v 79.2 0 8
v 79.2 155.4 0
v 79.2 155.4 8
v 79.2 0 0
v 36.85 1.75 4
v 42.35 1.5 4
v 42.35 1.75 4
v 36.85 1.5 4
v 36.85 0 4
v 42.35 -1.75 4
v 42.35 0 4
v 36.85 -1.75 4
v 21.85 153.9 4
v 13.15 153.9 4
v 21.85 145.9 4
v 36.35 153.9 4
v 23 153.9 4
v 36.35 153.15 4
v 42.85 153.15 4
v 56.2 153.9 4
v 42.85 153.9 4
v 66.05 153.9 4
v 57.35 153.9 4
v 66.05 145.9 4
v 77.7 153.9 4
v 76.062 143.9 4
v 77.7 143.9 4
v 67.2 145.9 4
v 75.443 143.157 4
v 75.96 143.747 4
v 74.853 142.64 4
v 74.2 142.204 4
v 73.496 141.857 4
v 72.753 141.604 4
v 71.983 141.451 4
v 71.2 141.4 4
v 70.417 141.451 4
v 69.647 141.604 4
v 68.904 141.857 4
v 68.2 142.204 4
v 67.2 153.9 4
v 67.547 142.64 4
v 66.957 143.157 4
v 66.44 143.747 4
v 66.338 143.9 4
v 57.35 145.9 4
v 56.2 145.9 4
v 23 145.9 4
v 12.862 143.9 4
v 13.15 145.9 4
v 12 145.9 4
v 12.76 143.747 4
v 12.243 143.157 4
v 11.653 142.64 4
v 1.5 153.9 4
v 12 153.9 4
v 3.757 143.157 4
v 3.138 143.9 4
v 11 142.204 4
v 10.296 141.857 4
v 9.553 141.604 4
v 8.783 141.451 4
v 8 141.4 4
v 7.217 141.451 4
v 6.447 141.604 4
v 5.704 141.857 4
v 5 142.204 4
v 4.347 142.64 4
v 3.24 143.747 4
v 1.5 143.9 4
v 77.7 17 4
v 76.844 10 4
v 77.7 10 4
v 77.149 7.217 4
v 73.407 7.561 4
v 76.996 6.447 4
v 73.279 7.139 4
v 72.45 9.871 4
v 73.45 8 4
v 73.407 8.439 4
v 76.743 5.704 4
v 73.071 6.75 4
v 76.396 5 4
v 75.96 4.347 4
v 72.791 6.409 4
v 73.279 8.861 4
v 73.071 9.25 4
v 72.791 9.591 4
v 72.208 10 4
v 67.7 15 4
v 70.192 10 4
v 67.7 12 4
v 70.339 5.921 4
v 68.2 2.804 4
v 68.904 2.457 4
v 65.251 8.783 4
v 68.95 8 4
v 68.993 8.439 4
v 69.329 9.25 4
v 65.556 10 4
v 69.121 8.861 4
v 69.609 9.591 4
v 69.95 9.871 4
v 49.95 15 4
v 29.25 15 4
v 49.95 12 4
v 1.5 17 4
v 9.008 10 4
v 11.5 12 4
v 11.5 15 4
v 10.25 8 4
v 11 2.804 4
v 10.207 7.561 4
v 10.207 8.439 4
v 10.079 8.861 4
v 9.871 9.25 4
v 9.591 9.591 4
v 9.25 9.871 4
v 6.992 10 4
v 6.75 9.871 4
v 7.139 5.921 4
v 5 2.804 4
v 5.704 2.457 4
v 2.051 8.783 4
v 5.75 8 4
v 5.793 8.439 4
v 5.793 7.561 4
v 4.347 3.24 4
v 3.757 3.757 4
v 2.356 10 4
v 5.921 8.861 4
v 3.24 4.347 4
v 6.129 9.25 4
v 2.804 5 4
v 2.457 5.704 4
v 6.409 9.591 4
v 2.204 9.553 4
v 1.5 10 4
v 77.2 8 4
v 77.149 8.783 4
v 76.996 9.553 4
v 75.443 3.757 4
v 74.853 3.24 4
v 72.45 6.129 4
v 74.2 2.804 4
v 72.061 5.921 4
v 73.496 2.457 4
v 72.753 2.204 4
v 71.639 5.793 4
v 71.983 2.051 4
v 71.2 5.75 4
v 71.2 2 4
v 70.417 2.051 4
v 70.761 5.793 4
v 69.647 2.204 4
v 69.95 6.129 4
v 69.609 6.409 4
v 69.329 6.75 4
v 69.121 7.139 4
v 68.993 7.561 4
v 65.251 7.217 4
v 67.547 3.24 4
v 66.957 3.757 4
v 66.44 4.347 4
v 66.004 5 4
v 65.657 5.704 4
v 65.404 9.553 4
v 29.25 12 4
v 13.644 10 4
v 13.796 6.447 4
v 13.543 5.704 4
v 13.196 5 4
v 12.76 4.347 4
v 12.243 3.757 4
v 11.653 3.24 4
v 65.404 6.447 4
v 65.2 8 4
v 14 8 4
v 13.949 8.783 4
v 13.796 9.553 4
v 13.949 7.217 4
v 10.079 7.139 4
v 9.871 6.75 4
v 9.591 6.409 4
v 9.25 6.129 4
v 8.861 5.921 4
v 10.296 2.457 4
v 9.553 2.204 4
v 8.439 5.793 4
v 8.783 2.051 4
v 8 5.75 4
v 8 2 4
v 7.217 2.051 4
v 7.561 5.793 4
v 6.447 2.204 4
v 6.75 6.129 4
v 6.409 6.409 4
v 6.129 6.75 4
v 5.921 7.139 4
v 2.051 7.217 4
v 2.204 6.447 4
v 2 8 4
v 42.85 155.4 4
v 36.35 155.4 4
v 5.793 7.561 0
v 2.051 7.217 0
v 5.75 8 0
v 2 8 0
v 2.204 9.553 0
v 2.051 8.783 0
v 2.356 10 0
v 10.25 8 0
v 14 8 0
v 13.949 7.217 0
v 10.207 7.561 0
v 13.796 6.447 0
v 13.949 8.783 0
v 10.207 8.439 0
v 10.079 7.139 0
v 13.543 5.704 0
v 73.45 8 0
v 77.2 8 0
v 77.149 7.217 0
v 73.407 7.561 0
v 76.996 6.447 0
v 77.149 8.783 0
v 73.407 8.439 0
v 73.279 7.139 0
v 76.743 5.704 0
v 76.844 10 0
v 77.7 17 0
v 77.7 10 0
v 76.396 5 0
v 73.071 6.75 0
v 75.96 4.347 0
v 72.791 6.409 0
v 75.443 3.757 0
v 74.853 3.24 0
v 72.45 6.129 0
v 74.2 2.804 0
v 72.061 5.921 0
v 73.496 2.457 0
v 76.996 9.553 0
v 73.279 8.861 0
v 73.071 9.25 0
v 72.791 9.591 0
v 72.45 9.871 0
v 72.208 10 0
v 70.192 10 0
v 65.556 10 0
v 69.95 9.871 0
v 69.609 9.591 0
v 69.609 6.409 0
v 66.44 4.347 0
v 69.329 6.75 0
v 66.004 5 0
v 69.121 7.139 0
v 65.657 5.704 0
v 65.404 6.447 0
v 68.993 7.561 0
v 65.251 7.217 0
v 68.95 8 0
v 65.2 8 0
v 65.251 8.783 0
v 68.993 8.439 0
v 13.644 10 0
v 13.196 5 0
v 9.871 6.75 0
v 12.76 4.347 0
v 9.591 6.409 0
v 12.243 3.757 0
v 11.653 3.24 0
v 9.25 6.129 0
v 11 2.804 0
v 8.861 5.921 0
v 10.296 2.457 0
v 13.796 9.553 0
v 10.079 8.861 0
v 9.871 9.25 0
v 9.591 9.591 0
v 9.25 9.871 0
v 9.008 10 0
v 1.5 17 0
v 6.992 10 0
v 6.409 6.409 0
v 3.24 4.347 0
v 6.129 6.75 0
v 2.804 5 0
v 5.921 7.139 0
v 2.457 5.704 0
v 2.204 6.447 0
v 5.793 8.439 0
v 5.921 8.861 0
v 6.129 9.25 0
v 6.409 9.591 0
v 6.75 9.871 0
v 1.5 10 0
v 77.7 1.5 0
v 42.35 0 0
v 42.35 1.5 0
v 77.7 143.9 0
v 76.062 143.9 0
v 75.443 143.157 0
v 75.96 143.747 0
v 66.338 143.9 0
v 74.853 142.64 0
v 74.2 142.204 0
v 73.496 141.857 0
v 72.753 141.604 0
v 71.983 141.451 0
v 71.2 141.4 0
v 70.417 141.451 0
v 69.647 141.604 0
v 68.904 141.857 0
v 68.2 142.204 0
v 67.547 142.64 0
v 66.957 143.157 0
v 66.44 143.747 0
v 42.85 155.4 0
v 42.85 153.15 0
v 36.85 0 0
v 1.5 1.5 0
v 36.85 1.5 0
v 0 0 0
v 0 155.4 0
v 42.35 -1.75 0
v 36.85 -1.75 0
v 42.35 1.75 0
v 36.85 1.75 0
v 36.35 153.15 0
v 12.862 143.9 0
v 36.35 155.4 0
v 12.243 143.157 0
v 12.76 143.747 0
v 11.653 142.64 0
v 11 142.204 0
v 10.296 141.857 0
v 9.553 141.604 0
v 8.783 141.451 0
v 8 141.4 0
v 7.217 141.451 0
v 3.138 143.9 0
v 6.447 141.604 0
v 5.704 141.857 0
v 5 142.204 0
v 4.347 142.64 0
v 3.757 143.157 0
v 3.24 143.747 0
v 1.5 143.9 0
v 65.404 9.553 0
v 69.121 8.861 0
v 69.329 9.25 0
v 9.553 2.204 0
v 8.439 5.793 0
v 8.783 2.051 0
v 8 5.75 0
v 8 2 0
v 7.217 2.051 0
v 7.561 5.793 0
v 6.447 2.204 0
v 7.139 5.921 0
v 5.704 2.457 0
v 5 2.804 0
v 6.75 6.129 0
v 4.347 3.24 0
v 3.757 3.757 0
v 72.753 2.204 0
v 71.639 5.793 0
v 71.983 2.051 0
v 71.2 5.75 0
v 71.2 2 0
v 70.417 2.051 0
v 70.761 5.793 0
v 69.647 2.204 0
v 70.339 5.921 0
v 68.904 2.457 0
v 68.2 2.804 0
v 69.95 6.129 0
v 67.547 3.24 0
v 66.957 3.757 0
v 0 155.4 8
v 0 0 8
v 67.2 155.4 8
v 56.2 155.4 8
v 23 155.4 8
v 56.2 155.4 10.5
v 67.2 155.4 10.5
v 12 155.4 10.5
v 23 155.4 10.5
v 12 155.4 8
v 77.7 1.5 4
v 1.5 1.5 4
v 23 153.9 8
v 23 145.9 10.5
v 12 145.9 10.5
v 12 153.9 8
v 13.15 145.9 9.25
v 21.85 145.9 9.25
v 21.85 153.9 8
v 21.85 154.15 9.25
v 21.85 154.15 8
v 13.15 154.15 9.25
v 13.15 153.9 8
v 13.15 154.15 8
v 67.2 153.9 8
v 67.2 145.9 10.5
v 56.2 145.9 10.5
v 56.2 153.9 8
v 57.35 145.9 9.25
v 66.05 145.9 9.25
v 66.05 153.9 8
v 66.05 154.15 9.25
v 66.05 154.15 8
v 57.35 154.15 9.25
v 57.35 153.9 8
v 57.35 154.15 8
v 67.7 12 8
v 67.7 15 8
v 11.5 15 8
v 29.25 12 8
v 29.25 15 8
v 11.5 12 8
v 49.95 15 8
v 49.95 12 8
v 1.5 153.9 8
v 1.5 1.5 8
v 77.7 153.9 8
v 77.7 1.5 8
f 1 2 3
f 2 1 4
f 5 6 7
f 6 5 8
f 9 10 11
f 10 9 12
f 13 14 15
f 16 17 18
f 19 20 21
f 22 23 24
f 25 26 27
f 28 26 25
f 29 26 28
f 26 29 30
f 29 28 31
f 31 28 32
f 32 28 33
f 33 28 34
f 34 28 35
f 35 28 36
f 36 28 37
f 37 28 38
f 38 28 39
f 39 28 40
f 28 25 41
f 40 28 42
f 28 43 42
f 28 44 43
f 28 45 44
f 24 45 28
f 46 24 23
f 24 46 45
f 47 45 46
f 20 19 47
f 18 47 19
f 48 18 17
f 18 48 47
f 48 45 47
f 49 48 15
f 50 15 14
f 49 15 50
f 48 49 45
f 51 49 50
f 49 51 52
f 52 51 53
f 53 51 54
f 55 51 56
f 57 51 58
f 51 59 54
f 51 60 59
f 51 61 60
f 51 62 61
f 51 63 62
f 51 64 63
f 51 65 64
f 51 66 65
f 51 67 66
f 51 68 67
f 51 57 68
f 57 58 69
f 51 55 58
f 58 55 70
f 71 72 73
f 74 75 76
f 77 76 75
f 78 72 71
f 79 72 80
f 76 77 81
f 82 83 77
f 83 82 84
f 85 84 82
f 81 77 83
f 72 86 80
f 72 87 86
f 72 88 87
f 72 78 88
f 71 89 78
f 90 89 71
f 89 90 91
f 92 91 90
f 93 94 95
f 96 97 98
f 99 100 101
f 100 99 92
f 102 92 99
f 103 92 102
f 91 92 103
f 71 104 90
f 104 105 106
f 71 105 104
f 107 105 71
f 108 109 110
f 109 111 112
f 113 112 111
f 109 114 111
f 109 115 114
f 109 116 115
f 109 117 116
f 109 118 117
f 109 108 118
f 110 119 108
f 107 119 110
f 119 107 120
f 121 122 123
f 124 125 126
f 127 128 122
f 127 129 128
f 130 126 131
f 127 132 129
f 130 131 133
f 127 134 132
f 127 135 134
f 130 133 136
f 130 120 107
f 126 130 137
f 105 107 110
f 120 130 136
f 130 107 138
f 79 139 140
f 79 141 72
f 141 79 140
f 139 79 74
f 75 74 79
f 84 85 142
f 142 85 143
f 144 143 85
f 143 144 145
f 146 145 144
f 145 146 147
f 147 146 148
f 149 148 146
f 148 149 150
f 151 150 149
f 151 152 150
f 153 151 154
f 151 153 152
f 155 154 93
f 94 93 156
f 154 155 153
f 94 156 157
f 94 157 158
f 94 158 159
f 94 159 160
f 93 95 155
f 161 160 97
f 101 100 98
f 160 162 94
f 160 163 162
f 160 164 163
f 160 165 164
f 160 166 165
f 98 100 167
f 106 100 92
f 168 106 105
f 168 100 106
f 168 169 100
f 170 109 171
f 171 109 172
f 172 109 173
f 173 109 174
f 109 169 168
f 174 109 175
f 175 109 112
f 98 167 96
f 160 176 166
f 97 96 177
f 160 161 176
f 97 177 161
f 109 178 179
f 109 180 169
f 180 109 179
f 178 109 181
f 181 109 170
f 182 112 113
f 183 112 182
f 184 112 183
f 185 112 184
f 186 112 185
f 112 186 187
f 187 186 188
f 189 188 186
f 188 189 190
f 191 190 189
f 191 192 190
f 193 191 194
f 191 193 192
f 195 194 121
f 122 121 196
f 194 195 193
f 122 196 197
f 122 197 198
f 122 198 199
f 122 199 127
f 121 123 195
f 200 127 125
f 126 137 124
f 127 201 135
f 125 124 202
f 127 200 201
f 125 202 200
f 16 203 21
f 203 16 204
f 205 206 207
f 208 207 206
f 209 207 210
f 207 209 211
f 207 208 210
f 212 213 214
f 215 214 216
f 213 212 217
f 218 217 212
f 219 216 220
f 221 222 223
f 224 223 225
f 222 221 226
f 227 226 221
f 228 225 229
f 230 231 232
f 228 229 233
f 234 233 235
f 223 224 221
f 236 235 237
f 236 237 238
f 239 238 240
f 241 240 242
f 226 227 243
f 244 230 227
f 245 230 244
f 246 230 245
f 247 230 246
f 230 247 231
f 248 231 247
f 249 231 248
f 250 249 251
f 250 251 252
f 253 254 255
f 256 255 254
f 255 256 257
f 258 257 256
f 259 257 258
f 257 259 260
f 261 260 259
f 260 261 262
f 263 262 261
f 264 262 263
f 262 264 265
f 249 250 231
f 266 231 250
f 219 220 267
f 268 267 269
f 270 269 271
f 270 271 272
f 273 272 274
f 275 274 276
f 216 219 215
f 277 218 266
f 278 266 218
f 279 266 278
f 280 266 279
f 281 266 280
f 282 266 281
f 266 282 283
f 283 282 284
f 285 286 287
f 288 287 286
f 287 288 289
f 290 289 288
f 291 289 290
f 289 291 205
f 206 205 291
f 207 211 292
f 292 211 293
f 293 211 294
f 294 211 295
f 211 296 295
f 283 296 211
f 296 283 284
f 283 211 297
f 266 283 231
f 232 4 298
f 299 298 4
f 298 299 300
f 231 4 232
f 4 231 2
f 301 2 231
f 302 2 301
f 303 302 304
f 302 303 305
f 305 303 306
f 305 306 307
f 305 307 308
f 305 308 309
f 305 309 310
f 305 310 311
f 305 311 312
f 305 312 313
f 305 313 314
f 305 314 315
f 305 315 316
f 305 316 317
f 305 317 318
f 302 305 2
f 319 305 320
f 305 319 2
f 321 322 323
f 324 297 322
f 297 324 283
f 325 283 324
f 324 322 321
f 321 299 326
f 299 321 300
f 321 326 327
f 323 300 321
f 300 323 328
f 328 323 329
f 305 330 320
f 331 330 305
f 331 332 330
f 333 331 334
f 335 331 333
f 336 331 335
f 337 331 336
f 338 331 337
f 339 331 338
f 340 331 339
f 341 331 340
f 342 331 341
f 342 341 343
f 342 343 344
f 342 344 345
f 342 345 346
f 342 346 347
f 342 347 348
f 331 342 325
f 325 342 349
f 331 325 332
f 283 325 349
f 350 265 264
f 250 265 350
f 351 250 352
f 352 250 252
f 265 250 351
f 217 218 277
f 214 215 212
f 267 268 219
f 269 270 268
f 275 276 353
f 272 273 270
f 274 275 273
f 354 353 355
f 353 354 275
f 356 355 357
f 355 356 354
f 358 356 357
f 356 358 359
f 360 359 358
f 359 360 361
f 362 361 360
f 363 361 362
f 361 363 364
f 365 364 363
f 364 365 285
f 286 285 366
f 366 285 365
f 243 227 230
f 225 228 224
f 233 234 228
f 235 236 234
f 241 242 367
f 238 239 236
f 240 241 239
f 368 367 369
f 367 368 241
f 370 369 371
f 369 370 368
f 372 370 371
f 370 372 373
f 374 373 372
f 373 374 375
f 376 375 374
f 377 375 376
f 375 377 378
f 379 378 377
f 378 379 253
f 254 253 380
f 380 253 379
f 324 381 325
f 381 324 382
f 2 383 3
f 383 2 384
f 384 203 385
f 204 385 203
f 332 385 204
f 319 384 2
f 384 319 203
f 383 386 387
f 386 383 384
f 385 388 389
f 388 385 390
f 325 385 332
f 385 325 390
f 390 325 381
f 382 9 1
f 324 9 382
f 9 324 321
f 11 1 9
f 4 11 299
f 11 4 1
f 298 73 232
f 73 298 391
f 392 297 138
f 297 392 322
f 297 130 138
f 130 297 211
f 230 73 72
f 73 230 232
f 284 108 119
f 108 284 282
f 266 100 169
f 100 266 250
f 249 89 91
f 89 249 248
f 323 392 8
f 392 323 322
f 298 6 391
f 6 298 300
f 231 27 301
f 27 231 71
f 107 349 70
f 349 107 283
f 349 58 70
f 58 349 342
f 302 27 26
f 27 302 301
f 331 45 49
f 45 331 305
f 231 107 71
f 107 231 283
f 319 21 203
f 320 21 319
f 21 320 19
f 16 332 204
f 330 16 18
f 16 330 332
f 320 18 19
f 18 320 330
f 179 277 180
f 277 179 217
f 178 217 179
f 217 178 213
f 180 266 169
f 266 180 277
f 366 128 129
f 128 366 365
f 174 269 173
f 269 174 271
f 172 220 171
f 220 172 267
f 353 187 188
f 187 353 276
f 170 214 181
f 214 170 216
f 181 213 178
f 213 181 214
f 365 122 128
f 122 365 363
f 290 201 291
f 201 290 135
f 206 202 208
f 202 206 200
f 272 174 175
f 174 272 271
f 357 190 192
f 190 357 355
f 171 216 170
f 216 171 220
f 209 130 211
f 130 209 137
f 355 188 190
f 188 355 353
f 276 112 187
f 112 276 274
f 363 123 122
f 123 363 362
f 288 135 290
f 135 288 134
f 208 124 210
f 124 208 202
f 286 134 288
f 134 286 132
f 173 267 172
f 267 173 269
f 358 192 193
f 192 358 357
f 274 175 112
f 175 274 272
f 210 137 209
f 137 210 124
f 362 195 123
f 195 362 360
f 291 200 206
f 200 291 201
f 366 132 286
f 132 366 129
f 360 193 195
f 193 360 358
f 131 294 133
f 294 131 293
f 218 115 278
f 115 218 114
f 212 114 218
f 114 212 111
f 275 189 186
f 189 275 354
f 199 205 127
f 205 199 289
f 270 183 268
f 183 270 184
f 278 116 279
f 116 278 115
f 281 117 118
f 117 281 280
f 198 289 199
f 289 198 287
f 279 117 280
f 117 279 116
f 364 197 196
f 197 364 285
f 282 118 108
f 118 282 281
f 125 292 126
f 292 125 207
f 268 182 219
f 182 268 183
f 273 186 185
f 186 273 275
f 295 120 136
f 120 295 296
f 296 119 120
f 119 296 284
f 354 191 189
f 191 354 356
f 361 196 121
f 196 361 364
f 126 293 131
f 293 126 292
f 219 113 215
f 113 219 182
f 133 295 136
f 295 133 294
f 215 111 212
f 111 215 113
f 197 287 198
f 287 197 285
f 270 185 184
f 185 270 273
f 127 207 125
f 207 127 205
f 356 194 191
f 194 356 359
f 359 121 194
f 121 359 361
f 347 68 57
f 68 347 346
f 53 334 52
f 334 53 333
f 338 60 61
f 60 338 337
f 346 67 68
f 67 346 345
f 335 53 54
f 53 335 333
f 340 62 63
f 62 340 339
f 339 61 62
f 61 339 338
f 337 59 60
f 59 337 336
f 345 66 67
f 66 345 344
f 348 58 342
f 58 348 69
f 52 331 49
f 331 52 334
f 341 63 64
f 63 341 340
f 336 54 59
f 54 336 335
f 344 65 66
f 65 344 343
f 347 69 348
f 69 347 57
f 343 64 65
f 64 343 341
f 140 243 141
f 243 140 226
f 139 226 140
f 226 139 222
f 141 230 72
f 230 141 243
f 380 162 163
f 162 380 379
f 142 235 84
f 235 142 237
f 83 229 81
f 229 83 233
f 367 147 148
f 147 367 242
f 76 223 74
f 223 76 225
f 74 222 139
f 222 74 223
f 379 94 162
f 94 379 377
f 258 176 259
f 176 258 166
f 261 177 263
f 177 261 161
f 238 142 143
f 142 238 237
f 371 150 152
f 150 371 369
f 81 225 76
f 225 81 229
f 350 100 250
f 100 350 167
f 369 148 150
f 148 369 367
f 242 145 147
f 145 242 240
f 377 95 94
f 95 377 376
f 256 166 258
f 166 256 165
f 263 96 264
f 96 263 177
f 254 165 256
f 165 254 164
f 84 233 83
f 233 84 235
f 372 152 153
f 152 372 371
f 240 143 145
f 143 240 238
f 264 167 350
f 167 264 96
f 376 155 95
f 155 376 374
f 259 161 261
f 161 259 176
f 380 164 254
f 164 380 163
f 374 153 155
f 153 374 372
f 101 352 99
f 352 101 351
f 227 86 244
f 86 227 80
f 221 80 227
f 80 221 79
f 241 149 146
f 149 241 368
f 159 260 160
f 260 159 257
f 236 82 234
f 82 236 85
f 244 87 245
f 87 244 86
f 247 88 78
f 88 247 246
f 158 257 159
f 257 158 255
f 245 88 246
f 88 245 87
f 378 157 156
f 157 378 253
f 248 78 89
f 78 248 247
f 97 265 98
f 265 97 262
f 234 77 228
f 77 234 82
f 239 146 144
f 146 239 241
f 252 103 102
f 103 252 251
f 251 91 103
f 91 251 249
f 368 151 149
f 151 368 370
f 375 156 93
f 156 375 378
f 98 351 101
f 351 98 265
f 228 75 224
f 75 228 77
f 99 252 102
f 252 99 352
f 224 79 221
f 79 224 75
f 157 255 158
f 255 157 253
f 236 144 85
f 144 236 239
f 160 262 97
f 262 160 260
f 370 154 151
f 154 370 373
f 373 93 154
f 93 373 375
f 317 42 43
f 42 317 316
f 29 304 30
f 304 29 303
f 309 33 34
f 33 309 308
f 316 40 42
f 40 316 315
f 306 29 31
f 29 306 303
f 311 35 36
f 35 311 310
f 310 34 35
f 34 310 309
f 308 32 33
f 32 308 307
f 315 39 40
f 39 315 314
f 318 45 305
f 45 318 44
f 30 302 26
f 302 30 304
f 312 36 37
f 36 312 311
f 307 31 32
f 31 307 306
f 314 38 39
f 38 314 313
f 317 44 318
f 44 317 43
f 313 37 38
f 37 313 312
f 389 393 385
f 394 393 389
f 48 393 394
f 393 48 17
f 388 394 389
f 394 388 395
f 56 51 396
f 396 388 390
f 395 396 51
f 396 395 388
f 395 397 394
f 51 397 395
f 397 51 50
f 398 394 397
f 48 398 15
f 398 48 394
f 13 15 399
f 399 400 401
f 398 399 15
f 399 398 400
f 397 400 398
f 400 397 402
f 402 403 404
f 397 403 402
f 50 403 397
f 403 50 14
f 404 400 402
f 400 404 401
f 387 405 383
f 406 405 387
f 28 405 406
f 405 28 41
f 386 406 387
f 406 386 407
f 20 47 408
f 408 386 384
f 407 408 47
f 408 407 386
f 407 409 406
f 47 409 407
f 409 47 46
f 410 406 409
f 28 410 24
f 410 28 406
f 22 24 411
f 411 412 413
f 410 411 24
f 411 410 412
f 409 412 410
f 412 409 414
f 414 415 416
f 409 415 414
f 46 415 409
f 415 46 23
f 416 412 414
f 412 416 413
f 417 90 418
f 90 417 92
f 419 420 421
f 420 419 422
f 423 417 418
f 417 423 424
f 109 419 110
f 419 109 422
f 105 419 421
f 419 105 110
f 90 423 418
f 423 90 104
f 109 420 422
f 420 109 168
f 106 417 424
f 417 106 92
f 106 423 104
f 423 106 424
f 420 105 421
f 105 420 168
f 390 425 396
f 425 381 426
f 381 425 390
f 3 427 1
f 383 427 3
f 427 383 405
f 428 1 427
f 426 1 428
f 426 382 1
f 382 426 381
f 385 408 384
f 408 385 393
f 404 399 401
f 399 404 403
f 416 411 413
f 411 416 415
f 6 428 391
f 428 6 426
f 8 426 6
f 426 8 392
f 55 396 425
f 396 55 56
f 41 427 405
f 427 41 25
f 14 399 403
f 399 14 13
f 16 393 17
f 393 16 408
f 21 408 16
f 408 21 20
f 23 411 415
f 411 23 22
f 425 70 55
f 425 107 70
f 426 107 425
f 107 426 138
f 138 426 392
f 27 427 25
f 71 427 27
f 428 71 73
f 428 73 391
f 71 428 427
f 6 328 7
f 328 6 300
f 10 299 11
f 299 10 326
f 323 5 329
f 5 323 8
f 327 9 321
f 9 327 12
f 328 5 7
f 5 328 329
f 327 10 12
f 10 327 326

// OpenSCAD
// Interchangeable snap-tile backsplash MVP, grid-A1 / carrier-A1 / clip-A1.
// Units are millimetres. Export one part at a time with -D 'part="grid"' etc.

$fn = 48;

tile_w = 76.2;
tile_h = 152.4;
grout = 3.0;
pitch_w = tile_w + grout;
pitch_h = tile_h + grout;
wall = 4.0;
rib = 1.5;
hook_depth = 8.0;
hook_height = 4.0;
// Hook envelope height as printed: 1mm base offset + (hook_height - 1) body +
// 1mm lip rise = hook_height + 1. Receiver clearance must be sized to this full
// envelope, not just hook_height, or the lip collides with the roof.
hook_env_h = hook_height + 1.0;
clip_datum = 12.0;
release_depth = 10.0;
mount_z = wall;
registration_clearance = 0.25;
fastener_diameter = 4.5;
fastener_boss_radius = 6.0;
fastener_offset = 8.0;
clearance = 0.35;
interface_y = pitch_h - rib - hook_depth;
hook_local_y = interface_y - rib + clearance;
hook_local_x_left = 16 - hook_depth / 2 + clearance;
hook_local_x_right = tile_w - 12 - hook_depth + clearance;
latch_tab_w = 20;
latch_tab_x0 = pitch_w / 2 - latch_tab_w / 2;
latch_rail_x0 = rib + 10;
latch_rail_x1 = pitch_w - rib - 10;
latch_rail_y0 = clip_datum;
latch_rail_depth = 3;
// Position the finger beyond the rail end while the ridge overlaps it by
// 0.15 mm, providing the intended insertion interference and seated capture.
clip_mount_x0 = latch_tab_x0 - clearance - rib + 0.35;
clip_mount_y0 = latch_rail_y0 + clearance - rib;
// Latch geometry: the tab is a single rigid, full-height block bonded directly
// into the carrier floor (durable, load-carrying, replaceable per-tile part).
// Compliance and retention live in the separately replaceable spring_clip.
ridge_reach = 0.9;
ridge_z0 = 3.0;
ridge_h = 1.0;
// Ridge tip construction allowance: hull() needs each control primitive to
// have real (non-zero) extent, so the tip primitive below is built as a tiny
// cube instead of a mathematical point. That cube is centered on x =
// ridge_reach (translated back by half its own width) instead of starting
// at ridge_reach and extending outward, so it adds only half its width to
// the modeled max reach, not its full width. Its size is also cut 5x smaller
// than a typical previous choice (0.01 mm) specifically so that residual is
// sub-micron and can be safely folded into ridge_reach_eff below rather than
// silently inflating the physical geometry past the documented ridge_reach.
ridge_pt_eps = 0.002;
// Modeled maximum X reach of the ridge, including the construction
// allowance above (ridge_reach + half of ridge_pt_eps): this is the value
// that must drive the insertion/removal calculation below, not the nominal
// ridge_reach alone, so the strain calculation matches the rendered geometry.
// ridge_reach_eff = 0.9 + 0.002 / 2 = 0.901 mm.
ridge_reach_eff = ridge_reach + ridge_pt_eps / 2;
// Spring-finger geometry (service-clip side): the replaceable clip contains a
// cantilever fixed only at its base and free over its full height, thin in
// the X (lateral flex) direction. Its root uses a finite-radius shoulder
// feature and is wider than the uniform finger section; the resulting
// shoulder concentration is included in the estimate below.
//
// The ridge occupies z = ridge_z0 to ridge_z0 + ridge_h, and its maximum
// reach is used as the strain load point. The strain-governing cantilever
// length is therefore the distance from the fixed root (z = wall) to that
// point, eff_l = ridge_z0 + ridge_h / 2 = 3.0 + 0.5 = 3.5 mm -- not
// hook_height (4.0 mm) as an earlier revision assumed.
//
// Clearing the ridge on insertion needs a lateral displacement of
// delta_pass = ridge_reach_eff - 2 * clearance = 0.901 - 2 * 0.35 =
// 0.201 mm. For a cantilever of length eff_l = 3.5 mm and thickness
// finger_w = 0.8 mm (bending direction), the nominal (unconcentrated)
// worst-case insertion fiber strain is
// eps_insert_nom = 3 * finger_w * delta_pass / (2 * eff_l^2)
//                = 3 * 0.8 * 0.201 / (2 * 3.5^2) = 0.4824 / 24.5 = 0.01969,
// i.e. ~1.97%.
//
// That nominal strain is a beam-theory average and does not by itself
// capture the root's stress (and strain) concentration from the
// finger_w -> finger_w + root_fillet_r shoulder fillet at z = wall. Modeling
// that root as a stepped-flat-bar shoulder fillet in bending (Peterson /
// Pilkey polynomial fit) with D = finger_w + root_fillet_r = 1.2 mm,
// d = finger_w = 0.8 mm, r = root_fillet_r = 0.4 mm:
//   h = (D - d) / 2 = 0.2 mm, h / r = 0.5 (in the 0.1-2.0 fit range), so
//   C1 = 1.006 + 0.967 * sqrt(h/r) + 0.013 * (h/r)       = 1.696
//   C2 = -0.270 - 2.372 * sqrt(h/r) + 0.708 * (h/r)      = -1.594
//   C3 = 0.662 + 1.157 * sqrt(h/r) - 0.908 * (h/r)       = 1.026
//   C4 = -0.405 + 0.249 * sqrt(h/r) - 0.200 * (h/r)      = -0.329
//   x = 2h / D = 0.4 / 1.2 = 0.333
//   Kt = C1 + C2 * x + C3 * x^2 + C4 * x^3 = 1.267
// (Pilkey, "Peterson's Stress Concentration Factors", shoulder-fillet-in-
// bending chart; C1..C4 depend only on h/r, which is fixed at 0.5 here
// because D - d always equals root_fillet_r by construction, independent of
// finger_w.)
//
// Peak local (root) strain = Kt * nominal strain:
// eps_insert = Kt * eps_insert_nom = 1.267 * 0.01969 = 0.02495, i.e. ~2.49%,
// under the 3% allowable-strain target for printed PLA/PETG flexures.
// Removal is symmetric about the ridge's mid-height (same delta_pass, same
// eff_l), so eps_remove = eps_insert = ~2.49%.
//
// In the seated position the finger is unloaded after the ridge passes the
// rigid rail end; insertion and removal therefore govern the cycle estimate.
finger_w = 0.8;
// Root shoulder radius used by the clip geometry and concentration estimate.
root_fillet_r = 0.4;
// Bonding epsilon keeps the durable rail rooted in the grid floor rather than
// relying on a coincident face. OpenSCAD warns that exactly-touching unions can
// render non-manifold or as separate shells.
// bond_eps sets how far each feature is extended into its parent solid; it
// is well within finger_w (0.8 mm) and does not change any externally
// visible dimension (hook_height, ridge_reach, eff_l, etc.).
bond_eps = 0.6;
// Upper-receiver capturing geometry: a back wall and roof beyond the hook's
// nominal footprint so the installed lip is captured, not just clearance-fit.
receiver_back = 1.5;
receiver_roof = 1.5;

part = "grid"; // grid, carrier, carrier_assembly, flex_clip, flex_coupon, spring_clip, coupon, hook_coupon, latch_coupon, registration_coupon, panel

module rounded_box(size, radius = 1.5) {
    translate([radius, radius, radius]) {
        minkowski() {
            cube([size[0] - 2 * radius, size[1] - 2 * radius, size[2] - 2 * radius]);
            sphere(radius);
        }
    }
}

module grid_section() {
    // The inspection hole is cut in two bands, leaving solid
    // full-width bridges under the latch rail and each upper-receiver housing so
    // those features bond into the perimeter frame instead of floating over the
    // open center.
    band_bottom_y0 = latch_rail_y0 - 2;
    band_bottom_y1 = latch_rail_y0 + latch_rail_depth + 2;
    band_top_y0 = interface_y - 2;
    band_top_y1 = interface_y + hook_depth + receiver_back + 2;
    difference() {
        cube([pitch_w, pitch_h, wall]);
        // Keep the center open so the wall surface can be inspected and dried.
        translate([rib, rib, -0.1])
            cube([pitch_w - 2 * rib, band_bottom_y0 - rib, wall + 0.2]);
        translate([rib, band_bottom_y1, -0.1])
            cube([pitch_w - 2 * rib, band_top_y0 - band_bottom_y1, wall + 0.2]);
        // Top edge receives the matching key from the section above.
            translate([pitch_w / 2 - 3 - registration_clearance,
                       pitch_h - 2 - registration_clearance, -0.1])
                cube([6 + 2 * registration_clearance,
                      4 + 2 * registration_clearance, wall + 0.2]);
    }
    // Reinforced corner bosses provide supported fastener locations outside
    // the inspection opening; each hole is sized by the attachment parameter.
    for (x = [fastener_offset, pitch_w - fastener_offset])
        for (y = [fastener_offset, pitch_h - fastener_offset])
            translate([x, y, 0])
                difference() {
                    cylinder(r = fastener_boss_radius, h = wall, $fn = 48);
                    translate([0, 0, -0.1])
                        cylinder(r = fastener_diameter / 2, h = wall + 0.2, $fn = 32);
                }
    // Perimeter ribs define the visible grout field.
    translate([0, 0, wall]) cube([pitch_w, rib, wall]);
    translate([0, pitch_h - rib, wall]) cube([pitch_w, rib, wall]);
    translate([0, rib, wall]) cube([rib, pitch_h - 2 * rib, wall]);
    translate([pitch_w - rib, rib, wall]) cube([rib, pitch_h - 2 * rib, wall]);
    // Upper hook receptacles and lower latch rails.
    for (x = [rib + 16, pitch_w - rib - 16])
        upper_receiver(x);
    latch_rail();
    // Bottom key mates with the receiving slot in the next section.
    translate([pitch_w / 2 - 3 + registration_clearance,
               -2 + registration_clearance, 0])
        cube([6 - 2 * registration_clearance,
              4 - 2 * registration_clearance, wall]);
}

module latch_rail() {
    // The grid supplies only durable mating geometry. Compliance and the
    // retention ridge live in the replaceable spring_clip.
    difference() {
        translate([latch_rail_x0, latch_rail_y0, wall - bond_eps])
            cube([latch_rail_x1 - latch_rail_x0, latch_rail_depth, hook_height + bond_eps]);
        translate([latch_tab_x0 - clearance, latch_rail_y0 - 0.1, wall - 0.1])
            cube([latch_tab_w + 2 * clearance, latch_rail_depth + 0.2, hook_height + 0.2]);
    }
}

module upper_receiver(x) {
    // Side walls flank the mating slot; the hook (see upper_hook) is inset by
    // `clearance` from this same nominal footprint on X and Z. The housing also
    // extends past the hook's nominal depth (Y) and height (Z) to leave a solid
    // back wall and roof: capturing geometry so the installed lip cannot pull
    // straight out along Y or Z. The front (toward the carrier body) stays open
    // so the hook keeps a solid root bridging into the carrier shell.
    housing_wall = 1.5;
    difference() {
        translate([x - hook_depth / 2 - housing_wall, interface_y, wall])
            cube([hook_depth + 2 * housing_wall,
                  hook_depth + receiver_back,
                  hook_env_h + receiver_roof]);
        // Cavity: the hook's nominal footprint plus installation clearance on X
        // and Z (sized to the hook's full envelope height, including its lip
        // rise) and an open front face, stopping short of the back wall and roof
        // so both remain solid and capture the hook's lip once installed.
        translate([x - hook_depth / 2 - clearance, interface_y - 0.1, wall - 0.1])
            cube([hook_depth + 2 * clearance, hook_depth + clearance, hook_env_h + clearance]);
    }
}

module upper_hook(x) {
    hook_w = hook_depth - 2 * clearance;
    hook_d = hook_depth - 2;
    hook_top = hook_height - 1;
    lip_rise = 1.0;
    translate([x, hook_local_y, 1]) {
        cube([hook_w, hook_d, hook_top]);
        // Lead-in chamfer built with hull() so it stays fully within the tongue's
        // own X/Y footprint; it only rises above the tongue's own top face and so
        // cannot reach the receiver's floor or back wall once installed.
        hull() {
            translate([0, hook_d - 2, hook_top - 0.1])
                cube([hook_w, 2, 0.1]);
            translate([0, hook_d - 2, hook_top])
                cube([hook_w, 0.1, lip_rise]);
        }
    }
}

module carrier_shell() {
    difference() {
        rounded_box([tile_w, tile_h, 5], 1.5);
        translate([3, 3, 2]) cube([tile_w - 6, tile_h - 6, 4]);
        // Concealed lower finger recess; the release path remains inspectable.
        translate([tile_w / 2 - release_depth / 2, -0.1, 0])
            cube([release_depth, 6, 3]);
    }
}

module carrier() {
    housing_wall = 1.5;
    // Rail-stub X ranges (left/right of the tab notch); the stub reliefs
    // below clear only these ranges. The tab itself is rigid and stays fully
    // bonded to the carrier floor; the service clip supplies compliance.
    stub1_x0 = latch_rail_x0;
    stub1_x1 = latch_tab_x0 - clearance;
    stub2_x0 = latch_tab_x0 + latch_tab_w + clearance;
    stub2_x1 = latch_rail_x1;
    translate([rib, rib, mount_z]) {
        difference() {
            carrier_shell();
            // Relief for each rigid rail stub (plus clearance) so the carrier's
            // flat floor never touches them; the tab region between the stubs
            // stays unrelieved and bonds fully into the carrier floor.
            translate([stub1_x0 - rib - clearance, latch_rail_y0 - rib - clearance, -0.1])
                cube([stub1_x1 - stub1_x0 + 2 * clearance,
                      latch_rail_depth + 2 * clearance,
                      hook_height + clearance + 0.1]);
            translate([stub2_x0 - rib - clearance, latch_rail_y0 - rib - clearance, -0.1])
                cube([stub2_x1 - stub2_x0 + 2 * clearance,
                      latch_rail_depth + 2 * clearance,
                      hook_height + clearance + 0.1]);
            // Relief frame (C-shaped, open on the near/front side) around each
            // receiver housing: clears the housing's side walls, back wall, and
            // roof (plus clearance), but leaves the hook's own footprint solid and
            // leaves the front (toward the carrier's body) completely unrelieved
            // so the floor forms a continuous bridge from the shell into the
            // hook's root -- the ring never fully encircles the hook footprint,
            // so it can't isolate it from the rest of the shell.
            for (x = [rib + 16, pitch_w - rib - 16])
                difference() {
                    translate([x - hook_depth / 2 - housing_wall - clearance - rib,
                               interface_y - rib,
                               -0.1])
                        cube([hook_depth + 2 * housing_wall + 2 * clearance,
                              hook_depth + receiver_back + clearance,
                              hook_env_h + receiver_roof + clearance + 0.1]);
                    translate([x - hook_depth / 2 - rib - 0.05,
                               interface_y - rib - 0.05,
                               -0.2])
                        cube([hook_depth + 0.1,
                              hook_depth + 0.1,
                              hook_env_h + receiver_roof + clearance + 0.6]);
                }
            // Service-clip pocket. Side ledges added below retain the
            // separately printed clip without fusing it to the carrier.
            translate([clip_mount_x0 - 0.2, clip_mount_y0 - 0.2, 1.4])
                cube([2.4, latch_rail_depth + 0.4, 1.0]);
        }
        // Each hook's own footprint remains solid and continuous with the carrier.
        upper_hook(hook_local_x_left);
        upper_hook(hook_local_x_right);
        translate([clip_mount_x0 - 0.2, clip_mount_y0 - 0.2, 1.4])
            cube([0.4, latch_rail_depth + 0.4, 0.6]);
        translate([clip_mount_x0 + 2.1, clip_mount_y0 - 0.2, 1.4])
            cube([0.4, latch_rail_depth + 0.4, 0.6]);
    }
}

module carrier_assembly() {
    // Preview only: print carrier() and spring_clip() as separate parts.
    carrier();
    translate([rib + clip_mount_x0, rib + clip_mount_y0, mount_z + 1.4])
        spring_clip_mount();
}

module flex_clip() {
    // Integral flexure comparison coupon; roots are rounded to reduce cracking.
    difference() {
        rounded_box([20, 18, 4], 1.5);
        translate([4, 5, -0.1]) cube([12, 10, 4.2]);
    }
    translate([8, 12, 3.8]) cube([4, 6, 5.2]);
}

module spring_clip_mount() {
    // Actual replaceable clip geometry. The 0.8 mm finger is isolated from
    // the carrier-facing base above the rounded root and carries the ridge.
    root_w = finger_w + root_fillet_r;
    finger_depth = latch_rail_depth - 0.8;
    union() {
        cube([2.0, latch_rail_depth, 0.8]);
        translate([root_fillet_r, 0.4, root_fillet_r])
            cube([finger_w, finger_depth, hook_height - root_fillet_r]);
        translate([0, 0.4, 0])
            cube([root_w, finger_depth, root_fillet_r]);
        translate([root_fillet_r, 0.4 + finger_depth, root_fillet_r])
            rotate([90, 0, 0])
                cylinder(r = root_fillet_r, h = finger_depth, $fn = 24);
        translate([root_fillet_r - ridge_reach_eff, 0.4, ridge_z0])
            cube([ridge_reach_eff + finger_w, finger_depth, ridge_h]);
    }
}

module spring_clip() {
    // Standalone service-clip export uses the same geometry as carrier().
    spring_clip_mount();
}

module flex_coupon() {
    // Detachable mating pieces for the integral-flexure comparison concept.
    for (i = [0:2]) {
        c = 0.20 + i * 0.15;
        translate([i * 32, 0, 0]) {
            translate([2, 2, 0]) coupon_receiver(c);
            translate([18, 2, 0]) flex_coupon_tab(c);
        }
    }
}

module flex_coupon_tab(c) {
    translate([1, 1, 0])
        cube([6 - 2 * c, 6, 3]);
    translate([2, 2, 3])
        cube([2, 4, 3]);
    translate([2, 2, 6])
        cube([2 + c, 4, 1]);
}

module coupon() {
    // Three mating-interface variants are laid out for one print and one measurement pass.
    for (i = [0:2]) {
        c = 0.20 + i * 0.15;
        translate([i * 32, 0, 0]) {
            cube([28, 30, 4]);
            // Paired clearance bars provide a repeatable dimensional coupon.
            translate([4, 4, 4]) cube([20, 4, 4]);
            translate([4, 8 + c, 4]) cube([20, 4, 4]);
            translate([4, 18, 4]) cube([20, 4, 4]);
            translate([4, 22 + c, 4]) cube([20, 4, 4]);
        }

    }
}

module hook_coupon() {
    for (i = [0:2]) {
        c = 0.20 + i * 0.15;
        translate([i * 32, 0, 0]) {
            translate([2, 2, 0]) coupon_receiver(c);
            translate([18, 2, 0]) coupon_hook(c);
        }
    }
}

module latch_coupon() {
    for (i = [0:2]) {
        c = 0.20 + i * 0.15;
        translate([i * 32, 0, 0]) {
            translate([2, 2, 0]) coupon_latch_receiver(0.35);
            // Hold the receiver datum fixed; vary the mating clip offset.
            translate([18, 2, 0]) coupon_latch_clip(c);
        }
    }
}

module registration_coupon() {
    for (i = [0:2]) {
        c = 0.20 + i * 0.15;
        translate([i * 32, 0, 0]) {
            translate([2, 2, 0]) cube([10, 10, wall]);
            translate([4, 5, wall]) cube([6 - 2 * c, 4 - 2 * c, 2]);
            difference() {
                translate([18, 2, 0]) cube([10, 10, wall]);
                translate([20, 4, -0.1])
                    cube([6 + 2 * c, 4 + 2 * c, wall + 0.2]);
            }
        }
    }
}

module coupon_receiver(c) {
    difference() {
        cube([10, 12, 7]);
        translate([1.5 - c, -0.1, 1.0 - c])
            cube([7 + 2 * c, 10.1, 5.5 + 2 * c]);
    }
}

module coupon_hook(c) {
    hook_w = 7 - 2 * c;
    translate([0, 1, 1]) {
        cube([hook_w, 6, 3]);
        translate([0, 4, 3])
            cube([hook_w, 2, 1]);
    }
}

module coupon_latch_receiver(c) {
    difference() {
        cube([10, 8, 5]);
        translate([1 - c, 1 - c, 2])
            cube([8 + 2 * c, 6 + 2 * c, 3.1]);
    }
}

module coupon_latch_clip(c) {
    translate([1, 1, 0])
        cube([1.2, 6, 2]);
    translate([1.2, 2, 2])
        cube([0.8, 4, 3]);
    translate([0.3, 2, 4])
        cube([0.9 + c, 4, 1]);
}

module panel() {
    for (col = [0:2])
        for (row = [0:2])
            translate([col * pitch_w, row * pitch_h, 0])
                grid_section();
}

if (part == "grid") grid_section();
if (part == "carrier") carrier();
if (part == "carrier_assembly") carrier_assembly();
if (part == "flex_clip") flex_clip();
if (part == "flex_coupon") flex_coupon();
if (part == "spring_clip") spring_clip();
if (part == "coupon") coupon();
if (part == "hook_coupon") hook_coupon();
if (part == "latch_coupon") latch_coupon();
if (part == "registration_coupon") registration_coupon();
if (part == "panel") panel();
